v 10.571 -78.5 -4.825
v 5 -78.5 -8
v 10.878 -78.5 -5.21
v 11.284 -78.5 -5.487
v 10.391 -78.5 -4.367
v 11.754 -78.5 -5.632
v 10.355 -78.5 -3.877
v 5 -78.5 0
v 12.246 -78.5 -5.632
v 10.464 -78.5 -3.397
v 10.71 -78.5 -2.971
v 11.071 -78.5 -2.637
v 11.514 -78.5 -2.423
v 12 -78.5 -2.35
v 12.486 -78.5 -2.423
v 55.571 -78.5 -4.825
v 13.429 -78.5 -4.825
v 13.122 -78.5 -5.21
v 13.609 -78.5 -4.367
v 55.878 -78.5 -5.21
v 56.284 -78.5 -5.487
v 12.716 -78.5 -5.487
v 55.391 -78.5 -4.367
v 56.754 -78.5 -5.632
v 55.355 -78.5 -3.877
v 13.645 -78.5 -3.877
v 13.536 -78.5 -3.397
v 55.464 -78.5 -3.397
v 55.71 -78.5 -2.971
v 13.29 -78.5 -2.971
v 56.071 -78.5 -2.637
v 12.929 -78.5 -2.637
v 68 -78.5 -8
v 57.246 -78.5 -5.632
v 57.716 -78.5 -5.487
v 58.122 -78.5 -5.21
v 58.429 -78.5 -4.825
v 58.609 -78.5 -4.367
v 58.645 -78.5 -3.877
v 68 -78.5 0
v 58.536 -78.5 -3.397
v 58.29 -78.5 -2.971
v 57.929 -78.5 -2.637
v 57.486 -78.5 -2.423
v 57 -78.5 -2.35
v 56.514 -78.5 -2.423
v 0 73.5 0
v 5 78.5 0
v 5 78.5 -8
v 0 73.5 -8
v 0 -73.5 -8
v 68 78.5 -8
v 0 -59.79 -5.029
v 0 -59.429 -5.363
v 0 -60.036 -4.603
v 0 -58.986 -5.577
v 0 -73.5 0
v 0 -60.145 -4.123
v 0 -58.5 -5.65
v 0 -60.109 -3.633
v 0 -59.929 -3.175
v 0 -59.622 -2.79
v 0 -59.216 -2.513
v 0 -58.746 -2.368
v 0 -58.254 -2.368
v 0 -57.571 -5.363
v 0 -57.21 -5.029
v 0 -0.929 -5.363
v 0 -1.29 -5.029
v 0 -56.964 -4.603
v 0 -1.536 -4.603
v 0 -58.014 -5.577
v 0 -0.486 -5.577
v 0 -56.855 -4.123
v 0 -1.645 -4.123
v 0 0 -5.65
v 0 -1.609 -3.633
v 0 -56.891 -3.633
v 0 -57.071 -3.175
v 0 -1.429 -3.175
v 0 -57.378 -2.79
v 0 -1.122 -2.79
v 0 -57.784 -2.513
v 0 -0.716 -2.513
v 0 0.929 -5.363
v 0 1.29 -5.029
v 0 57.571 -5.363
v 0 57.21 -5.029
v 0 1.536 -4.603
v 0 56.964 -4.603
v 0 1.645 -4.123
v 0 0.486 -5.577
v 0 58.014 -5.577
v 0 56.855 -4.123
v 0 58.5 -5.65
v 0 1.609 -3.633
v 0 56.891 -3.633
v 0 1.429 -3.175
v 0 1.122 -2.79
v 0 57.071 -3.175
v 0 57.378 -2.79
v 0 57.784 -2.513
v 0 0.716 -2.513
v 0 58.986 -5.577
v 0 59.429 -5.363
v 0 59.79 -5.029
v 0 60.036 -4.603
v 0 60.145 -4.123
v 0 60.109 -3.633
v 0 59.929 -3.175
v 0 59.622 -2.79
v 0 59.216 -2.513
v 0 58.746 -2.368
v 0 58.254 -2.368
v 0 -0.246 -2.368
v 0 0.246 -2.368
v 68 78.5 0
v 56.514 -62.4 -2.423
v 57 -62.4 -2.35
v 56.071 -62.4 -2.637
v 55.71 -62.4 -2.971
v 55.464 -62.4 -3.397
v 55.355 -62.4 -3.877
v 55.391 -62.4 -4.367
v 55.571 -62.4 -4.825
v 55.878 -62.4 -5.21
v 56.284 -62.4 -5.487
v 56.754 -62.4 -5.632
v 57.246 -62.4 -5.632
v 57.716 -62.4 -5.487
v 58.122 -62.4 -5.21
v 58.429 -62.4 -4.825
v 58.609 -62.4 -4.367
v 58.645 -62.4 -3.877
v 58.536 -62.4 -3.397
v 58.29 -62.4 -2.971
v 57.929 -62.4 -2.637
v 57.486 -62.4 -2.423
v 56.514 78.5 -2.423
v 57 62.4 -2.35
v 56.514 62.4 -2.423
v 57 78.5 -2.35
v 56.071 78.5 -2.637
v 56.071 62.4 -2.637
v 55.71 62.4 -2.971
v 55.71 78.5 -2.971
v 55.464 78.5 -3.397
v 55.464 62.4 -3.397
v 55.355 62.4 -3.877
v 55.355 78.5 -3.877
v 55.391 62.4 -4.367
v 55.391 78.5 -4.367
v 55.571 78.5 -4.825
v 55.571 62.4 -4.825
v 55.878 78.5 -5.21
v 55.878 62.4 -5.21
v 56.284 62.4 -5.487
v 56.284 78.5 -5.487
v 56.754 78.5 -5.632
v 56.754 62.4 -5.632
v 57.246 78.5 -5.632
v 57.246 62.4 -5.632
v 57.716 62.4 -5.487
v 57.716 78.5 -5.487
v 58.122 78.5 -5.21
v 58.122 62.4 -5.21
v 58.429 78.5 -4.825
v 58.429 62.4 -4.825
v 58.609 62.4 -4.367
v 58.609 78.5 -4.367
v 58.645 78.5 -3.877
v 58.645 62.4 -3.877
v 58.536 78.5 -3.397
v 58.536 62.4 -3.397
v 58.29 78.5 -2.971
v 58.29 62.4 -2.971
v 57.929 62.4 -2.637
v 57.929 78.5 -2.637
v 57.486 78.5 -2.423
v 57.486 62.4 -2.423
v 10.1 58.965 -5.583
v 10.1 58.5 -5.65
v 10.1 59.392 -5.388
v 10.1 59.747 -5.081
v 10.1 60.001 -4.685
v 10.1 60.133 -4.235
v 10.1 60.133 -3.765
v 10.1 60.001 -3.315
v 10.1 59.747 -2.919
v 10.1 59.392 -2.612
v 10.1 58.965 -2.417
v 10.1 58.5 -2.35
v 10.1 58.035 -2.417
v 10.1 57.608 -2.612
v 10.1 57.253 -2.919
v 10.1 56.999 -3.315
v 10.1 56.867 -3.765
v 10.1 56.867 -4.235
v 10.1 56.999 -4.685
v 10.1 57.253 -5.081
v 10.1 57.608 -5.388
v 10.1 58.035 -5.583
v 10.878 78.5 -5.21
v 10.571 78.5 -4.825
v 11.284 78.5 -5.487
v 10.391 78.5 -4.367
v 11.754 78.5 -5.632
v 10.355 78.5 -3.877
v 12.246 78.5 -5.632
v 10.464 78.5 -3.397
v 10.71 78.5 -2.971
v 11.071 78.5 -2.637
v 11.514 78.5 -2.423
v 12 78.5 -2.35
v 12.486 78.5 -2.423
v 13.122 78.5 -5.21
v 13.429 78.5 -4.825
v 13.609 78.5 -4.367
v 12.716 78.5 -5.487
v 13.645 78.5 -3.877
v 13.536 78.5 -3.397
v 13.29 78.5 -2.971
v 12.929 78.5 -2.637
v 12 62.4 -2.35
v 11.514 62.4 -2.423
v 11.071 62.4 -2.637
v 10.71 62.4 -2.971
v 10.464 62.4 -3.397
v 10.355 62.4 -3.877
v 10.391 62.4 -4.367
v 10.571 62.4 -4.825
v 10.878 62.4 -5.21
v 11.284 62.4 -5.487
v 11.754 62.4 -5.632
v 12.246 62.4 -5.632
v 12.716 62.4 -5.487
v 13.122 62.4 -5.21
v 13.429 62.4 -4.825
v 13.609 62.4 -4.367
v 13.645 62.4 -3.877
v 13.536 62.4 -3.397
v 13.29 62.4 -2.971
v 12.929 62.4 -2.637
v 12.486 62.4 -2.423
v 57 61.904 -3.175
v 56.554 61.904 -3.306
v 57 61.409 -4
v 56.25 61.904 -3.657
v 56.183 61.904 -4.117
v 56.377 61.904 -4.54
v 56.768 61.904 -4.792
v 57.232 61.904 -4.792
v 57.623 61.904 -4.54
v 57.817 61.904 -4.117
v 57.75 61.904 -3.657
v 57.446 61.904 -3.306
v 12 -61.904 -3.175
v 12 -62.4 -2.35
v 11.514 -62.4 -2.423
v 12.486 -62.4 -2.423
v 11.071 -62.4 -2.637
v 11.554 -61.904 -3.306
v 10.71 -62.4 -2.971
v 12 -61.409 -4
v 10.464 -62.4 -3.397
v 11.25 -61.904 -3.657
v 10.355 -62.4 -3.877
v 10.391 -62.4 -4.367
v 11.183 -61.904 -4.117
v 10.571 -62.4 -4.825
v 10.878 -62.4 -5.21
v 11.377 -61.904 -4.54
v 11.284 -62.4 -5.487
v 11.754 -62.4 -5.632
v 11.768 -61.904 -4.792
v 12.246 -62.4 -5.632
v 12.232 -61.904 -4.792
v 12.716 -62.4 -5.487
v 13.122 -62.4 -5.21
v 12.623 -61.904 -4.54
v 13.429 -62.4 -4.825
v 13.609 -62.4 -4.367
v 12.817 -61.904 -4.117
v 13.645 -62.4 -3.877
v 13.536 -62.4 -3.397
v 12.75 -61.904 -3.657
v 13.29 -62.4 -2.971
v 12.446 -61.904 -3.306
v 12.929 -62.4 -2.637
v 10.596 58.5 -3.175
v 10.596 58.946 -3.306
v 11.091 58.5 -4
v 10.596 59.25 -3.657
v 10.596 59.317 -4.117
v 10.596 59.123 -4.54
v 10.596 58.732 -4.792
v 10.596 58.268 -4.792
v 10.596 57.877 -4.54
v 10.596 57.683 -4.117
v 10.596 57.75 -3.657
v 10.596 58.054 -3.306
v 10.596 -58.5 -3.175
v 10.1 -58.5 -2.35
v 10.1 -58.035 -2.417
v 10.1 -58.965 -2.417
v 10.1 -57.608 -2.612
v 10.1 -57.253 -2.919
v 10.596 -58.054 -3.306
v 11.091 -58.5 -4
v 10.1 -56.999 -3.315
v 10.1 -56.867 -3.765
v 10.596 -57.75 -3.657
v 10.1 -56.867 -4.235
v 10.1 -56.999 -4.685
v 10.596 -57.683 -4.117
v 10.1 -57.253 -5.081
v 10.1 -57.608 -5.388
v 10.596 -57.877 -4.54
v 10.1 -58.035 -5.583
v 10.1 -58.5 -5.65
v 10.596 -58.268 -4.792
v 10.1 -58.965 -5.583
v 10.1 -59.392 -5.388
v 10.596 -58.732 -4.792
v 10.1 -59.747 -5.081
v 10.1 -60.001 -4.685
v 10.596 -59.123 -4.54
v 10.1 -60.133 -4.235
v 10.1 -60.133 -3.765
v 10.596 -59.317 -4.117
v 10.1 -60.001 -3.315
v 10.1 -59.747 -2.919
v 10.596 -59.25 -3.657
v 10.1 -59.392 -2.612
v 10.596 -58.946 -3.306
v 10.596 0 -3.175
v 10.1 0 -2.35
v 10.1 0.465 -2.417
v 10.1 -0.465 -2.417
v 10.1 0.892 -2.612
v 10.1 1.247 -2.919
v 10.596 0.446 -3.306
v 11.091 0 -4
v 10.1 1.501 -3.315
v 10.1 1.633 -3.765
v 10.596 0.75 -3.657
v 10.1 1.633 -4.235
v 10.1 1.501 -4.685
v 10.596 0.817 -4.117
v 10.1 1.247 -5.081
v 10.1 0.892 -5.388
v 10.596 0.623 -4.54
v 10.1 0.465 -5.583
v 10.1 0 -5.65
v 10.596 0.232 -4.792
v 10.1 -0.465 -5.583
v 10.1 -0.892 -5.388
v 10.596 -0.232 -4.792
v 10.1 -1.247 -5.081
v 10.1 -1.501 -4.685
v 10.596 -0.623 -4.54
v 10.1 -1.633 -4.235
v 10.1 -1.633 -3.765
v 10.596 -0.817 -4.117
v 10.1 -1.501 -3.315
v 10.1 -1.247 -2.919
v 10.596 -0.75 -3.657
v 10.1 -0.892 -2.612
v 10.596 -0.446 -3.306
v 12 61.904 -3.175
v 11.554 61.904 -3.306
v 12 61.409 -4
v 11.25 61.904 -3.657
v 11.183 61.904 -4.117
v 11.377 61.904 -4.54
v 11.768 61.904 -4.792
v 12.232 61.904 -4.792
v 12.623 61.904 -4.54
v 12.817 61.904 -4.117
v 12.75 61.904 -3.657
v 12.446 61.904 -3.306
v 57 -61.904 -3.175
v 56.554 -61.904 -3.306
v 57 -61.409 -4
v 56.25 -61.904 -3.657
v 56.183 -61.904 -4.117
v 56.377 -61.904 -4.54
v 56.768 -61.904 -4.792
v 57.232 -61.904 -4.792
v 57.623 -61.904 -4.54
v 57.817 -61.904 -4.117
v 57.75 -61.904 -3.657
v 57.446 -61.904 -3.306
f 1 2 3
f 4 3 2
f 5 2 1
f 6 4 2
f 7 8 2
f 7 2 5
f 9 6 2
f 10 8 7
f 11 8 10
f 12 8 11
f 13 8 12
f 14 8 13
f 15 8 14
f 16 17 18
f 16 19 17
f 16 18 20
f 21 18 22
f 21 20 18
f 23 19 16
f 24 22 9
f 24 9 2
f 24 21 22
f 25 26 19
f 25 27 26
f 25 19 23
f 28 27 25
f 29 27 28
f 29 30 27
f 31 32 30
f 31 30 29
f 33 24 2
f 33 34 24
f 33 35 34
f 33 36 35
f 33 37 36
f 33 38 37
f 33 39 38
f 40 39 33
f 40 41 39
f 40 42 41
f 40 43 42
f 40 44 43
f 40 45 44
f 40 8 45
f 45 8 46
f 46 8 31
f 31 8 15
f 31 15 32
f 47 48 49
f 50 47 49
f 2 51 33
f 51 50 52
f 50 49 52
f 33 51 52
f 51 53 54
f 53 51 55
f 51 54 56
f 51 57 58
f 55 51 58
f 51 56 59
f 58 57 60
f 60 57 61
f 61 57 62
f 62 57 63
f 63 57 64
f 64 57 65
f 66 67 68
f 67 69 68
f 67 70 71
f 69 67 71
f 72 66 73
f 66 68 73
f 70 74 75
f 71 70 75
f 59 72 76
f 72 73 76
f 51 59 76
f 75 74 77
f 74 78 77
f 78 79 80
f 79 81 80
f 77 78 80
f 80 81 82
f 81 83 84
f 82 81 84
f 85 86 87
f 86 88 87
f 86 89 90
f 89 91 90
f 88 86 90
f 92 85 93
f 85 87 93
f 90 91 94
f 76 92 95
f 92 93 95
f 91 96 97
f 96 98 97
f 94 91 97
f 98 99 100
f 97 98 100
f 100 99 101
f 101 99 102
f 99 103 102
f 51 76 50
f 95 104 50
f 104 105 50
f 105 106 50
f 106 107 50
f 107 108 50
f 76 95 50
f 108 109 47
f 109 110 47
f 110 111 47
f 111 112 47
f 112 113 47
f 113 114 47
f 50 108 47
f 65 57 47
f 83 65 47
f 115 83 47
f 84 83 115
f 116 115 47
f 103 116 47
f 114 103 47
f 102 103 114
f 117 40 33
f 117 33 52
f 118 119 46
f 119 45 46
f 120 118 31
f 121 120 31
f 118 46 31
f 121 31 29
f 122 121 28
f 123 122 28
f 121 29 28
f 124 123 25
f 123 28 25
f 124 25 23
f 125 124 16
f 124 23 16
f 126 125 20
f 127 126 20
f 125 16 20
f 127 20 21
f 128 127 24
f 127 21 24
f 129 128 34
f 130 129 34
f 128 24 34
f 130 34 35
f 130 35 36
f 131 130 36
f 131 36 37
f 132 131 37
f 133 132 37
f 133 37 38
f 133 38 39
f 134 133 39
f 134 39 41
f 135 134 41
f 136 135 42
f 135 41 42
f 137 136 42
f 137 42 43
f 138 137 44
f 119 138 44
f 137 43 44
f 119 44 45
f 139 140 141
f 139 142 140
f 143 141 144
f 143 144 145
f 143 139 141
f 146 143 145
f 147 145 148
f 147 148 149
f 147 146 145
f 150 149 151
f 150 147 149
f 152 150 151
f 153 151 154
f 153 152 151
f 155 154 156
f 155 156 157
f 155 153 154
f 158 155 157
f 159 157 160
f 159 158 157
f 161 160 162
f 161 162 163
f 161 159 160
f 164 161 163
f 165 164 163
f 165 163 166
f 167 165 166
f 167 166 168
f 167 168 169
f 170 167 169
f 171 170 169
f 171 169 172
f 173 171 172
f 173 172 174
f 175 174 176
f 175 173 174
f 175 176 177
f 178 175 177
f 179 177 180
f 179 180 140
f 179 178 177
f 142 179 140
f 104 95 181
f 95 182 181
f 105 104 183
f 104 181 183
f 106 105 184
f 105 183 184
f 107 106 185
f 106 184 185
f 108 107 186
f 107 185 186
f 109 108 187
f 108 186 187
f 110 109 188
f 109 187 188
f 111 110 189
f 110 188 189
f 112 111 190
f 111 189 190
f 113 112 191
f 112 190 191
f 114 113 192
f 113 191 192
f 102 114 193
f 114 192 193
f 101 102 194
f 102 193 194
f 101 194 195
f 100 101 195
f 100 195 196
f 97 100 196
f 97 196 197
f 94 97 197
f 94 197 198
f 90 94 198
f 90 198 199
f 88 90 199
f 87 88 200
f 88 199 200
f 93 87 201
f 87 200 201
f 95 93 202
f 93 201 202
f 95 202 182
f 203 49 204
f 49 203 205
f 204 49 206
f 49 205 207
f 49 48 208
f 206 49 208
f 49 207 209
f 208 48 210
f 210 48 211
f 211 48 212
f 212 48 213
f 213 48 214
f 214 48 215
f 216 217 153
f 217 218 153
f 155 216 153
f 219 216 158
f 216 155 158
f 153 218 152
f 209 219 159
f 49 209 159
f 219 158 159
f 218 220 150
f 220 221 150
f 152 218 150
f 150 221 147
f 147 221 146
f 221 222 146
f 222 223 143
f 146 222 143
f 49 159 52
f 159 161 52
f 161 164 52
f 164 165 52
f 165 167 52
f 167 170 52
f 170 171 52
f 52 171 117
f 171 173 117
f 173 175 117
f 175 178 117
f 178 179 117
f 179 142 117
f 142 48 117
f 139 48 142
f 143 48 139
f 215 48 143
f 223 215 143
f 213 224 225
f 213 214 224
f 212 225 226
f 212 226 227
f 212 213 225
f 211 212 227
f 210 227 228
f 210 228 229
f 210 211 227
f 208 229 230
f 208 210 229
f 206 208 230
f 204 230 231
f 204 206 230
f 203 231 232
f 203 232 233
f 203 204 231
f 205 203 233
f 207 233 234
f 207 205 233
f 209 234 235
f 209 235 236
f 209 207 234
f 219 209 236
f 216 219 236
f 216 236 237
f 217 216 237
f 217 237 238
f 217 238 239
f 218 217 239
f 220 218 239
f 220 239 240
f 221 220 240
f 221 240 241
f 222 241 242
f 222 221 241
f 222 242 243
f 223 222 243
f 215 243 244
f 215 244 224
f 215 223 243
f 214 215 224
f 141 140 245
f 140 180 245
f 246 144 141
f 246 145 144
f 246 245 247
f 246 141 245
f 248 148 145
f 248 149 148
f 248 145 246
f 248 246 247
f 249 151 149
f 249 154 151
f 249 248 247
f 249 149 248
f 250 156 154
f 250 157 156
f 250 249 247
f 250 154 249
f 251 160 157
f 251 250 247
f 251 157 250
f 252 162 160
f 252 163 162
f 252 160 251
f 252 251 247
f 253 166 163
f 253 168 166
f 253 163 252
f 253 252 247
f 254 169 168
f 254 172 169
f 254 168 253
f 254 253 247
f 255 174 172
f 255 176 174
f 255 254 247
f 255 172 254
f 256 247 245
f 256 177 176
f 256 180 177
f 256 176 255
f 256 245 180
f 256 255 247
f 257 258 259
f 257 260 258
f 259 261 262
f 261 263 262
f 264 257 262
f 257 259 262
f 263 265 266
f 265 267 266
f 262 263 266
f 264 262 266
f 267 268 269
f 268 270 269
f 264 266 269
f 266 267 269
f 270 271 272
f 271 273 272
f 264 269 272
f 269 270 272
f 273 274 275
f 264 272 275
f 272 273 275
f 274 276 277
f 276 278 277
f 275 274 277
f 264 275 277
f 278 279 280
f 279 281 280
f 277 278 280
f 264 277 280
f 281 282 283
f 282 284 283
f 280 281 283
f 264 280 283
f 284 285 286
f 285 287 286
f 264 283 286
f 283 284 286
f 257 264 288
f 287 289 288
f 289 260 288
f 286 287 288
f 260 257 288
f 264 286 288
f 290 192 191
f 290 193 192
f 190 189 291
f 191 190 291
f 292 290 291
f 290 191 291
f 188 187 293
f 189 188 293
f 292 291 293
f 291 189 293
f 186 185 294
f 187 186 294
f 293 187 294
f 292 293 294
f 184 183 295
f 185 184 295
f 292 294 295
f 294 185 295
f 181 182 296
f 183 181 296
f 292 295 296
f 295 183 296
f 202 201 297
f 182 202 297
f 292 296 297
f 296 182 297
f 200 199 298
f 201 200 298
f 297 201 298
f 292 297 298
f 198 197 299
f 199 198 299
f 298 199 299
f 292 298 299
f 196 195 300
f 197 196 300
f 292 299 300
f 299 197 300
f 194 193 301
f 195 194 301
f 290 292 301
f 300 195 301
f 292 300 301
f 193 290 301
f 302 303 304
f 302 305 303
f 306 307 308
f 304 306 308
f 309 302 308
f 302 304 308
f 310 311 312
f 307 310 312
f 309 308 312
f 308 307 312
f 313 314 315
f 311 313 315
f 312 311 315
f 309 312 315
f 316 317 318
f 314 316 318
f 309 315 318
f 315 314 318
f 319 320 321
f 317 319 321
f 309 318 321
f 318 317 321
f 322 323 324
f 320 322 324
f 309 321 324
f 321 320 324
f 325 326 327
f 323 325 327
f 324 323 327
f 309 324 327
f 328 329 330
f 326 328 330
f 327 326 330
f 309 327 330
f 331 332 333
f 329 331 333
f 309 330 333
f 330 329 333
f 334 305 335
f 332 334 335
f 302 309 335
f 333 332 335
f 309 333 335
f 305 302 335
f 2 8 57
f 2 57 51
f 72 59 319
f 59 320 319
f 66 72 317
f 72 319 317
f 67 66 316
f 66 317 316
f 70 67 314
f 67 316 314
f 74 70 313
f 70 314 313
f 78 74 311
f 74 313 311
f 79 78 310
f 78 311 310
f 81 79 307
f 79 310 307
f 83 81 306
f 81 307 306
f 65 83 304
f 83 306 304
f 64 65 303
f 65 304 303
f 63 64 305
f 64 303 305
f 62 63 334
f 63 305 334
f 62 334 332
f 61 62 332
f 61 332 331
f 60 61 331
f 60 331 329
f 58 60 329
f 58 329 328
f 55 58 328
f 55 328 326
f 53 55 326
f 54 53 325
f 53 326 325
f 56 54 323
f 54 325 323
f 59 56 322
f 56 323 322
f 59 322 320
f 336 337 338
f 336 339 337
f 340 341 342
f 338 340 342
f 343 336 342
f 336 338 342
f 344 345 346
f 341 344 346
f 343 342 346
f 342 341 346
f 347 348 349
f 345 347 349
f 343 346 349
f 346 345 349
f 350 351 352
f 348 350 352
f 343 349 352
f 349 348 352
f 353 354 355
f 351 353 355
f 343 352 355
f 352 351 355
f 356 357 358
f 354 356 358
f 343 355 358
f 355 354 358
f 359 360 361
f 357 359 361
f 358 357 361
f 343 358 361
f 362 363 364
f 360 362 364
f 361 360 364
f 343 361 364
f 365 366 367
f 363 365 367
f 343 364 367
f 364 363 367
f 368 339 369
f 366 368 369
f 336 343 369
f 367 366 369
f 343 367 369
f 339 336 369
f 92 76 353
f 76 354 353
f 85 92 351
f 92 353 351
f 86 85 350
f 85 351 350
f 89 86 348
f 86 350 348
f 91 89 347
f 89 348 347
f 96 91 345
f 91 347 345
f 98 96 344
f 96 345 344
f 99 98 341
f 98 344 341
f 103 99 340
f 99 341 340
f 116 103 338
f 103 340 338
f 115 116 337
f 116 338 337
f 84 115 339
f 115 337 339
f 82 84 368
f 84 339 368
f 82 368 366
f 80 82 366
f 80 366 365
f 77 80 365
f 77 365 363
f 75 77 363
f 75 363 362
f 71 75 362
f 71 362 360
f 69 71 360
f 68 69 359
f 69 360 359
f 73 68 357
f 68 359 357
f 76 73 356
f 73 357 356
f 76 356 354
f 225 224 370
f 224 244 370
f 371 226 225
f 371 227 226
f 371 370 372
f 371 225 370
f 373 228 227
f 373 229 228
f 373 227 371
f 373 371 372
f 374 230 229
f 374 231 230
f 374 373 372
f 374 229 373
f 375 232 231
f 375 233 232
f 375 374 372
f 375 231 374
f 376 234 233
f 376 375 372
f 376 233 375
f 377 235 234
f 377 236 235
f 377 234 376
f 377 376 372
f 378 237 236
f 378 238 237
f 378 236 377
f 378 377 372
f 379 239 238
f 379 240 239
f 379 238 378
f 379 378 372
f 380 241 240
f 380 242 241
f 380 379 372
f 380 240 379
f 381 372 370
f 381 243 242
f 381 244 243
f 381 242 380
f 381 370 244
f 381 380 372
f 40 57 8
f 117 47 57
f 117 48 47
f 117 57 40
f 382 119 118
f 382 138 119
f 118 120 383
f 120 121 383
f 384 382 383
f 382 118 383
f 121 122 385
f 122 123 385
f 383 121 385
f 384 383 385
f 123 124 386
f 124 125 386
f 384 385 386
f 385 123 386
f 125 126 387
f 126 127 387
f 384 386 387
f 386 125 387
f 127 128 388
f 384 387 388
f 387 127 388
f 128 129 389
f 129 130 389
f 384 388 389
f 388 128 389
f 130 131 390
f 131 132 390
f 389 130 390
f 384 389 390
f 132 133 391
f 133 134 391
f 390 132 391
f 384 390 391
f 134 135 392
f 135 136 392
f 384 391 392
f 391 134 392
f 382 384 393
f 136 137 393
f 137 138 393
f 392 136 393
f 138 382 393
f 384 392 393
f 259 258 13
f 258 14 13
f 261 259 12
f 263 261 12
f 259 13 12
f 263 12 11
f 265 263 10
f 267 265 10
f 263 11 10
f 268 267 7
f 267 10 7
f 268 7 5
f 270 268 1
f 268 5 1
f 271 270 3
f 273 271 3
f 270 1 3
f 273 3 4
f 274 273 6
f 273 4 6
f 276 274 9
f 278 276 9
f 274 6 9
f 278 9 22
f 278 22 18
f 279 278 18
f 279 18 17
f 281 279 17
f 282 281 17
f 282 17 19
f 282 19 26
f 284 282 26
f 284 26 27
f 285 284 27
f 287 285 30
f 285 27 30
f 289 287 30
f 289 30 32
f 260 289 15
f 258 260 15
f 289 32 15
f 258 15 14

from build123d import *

# Parameters (mm, degrees)
SKETCH1_W                      = 68
SKETCH1_H                      = 157
BOSS_EXTRUDE1_DEPTH            = 8
M4X0_7_TAPPED_HOLE1_AT_2_COUNT = 2
M4X0_7_TAPPED_HOLE1_AT_2_PITCH = 45
M4X0_7_TAPPED_HOLE2_D          = 3.3
M4X0_7_TAPPED_HOLE2_DEPTH      = 10.1
M4X0_7_TAPPED_HOLE2_TIP        = 0.991420021
CHAMFER1_SIZE                  = 5


with BuildPart() as part:
    # Sketch1 → Boss-Extrude1 (new body)
    with BuildSketch(Plane.XY):
        with Locations((34, 0)):
            Rectangle(SKETCH1_W, SKETCH1_H)
    extrude(amount=-BOSS_EXTRUDE1_DEPTH)

    # Sketch4 → M4x0.7 Tapped Hole1 (revolve, cut)
    with BuildSketch(Plane(origin=(12, 78.5, -4), x_dir=(0, 0, 1), z_dir=(1, 0, 0))):
        Polygon((0, 0), (0, 17.091420021), (1.65, 16.1), (1.65, 0), align=None)
    m4x0_7_tapped_hole1 = revolve(axis=Axis((12, 84.85, -4), (0, -1, 0)), mode=Mode.SUBTRACT)

    # M4x0.7 Tapped Hole1 at 2: M4x0.7 Tapped Hole1 ×2
    with Locations(*[(i * M4X0_7_TAPPED_HOLE1_AT_2_PITCH, 0, 0) for i in range(1, M4X0_7_TAPPED_HOLE1_AT_2_COUNT)]):
        add(m4x0_7_tapped_hole1, mode=Mode.SUBTRACT)

    # M4x0.7 Tapped Hole2
    with Locations(Plane.ZY):
        with Locations((-4, 58.5), (-4, 0), (-4, -58.5)):
            Hole(M4X0_7_TAPPED_HOLE2_D / 2, depth=M4X0_7_TAPPED_HOLE2_DEPTH)
            with Locations((0, 0, -(M4X0_7_TAPPED_HOLE2_DEPTH + M4X0_7_TAPPED_HOLE2_TIP / 2))):  # 118° drill point
                Cone(0, M4X0_7_TAPPED_HOLE2_D / 2, M4X0_7_TAPPED_HOLE2_TIP, mode=Mode.SUBTRACT)

    # Mirror1: M4x0.7 Tapped Hole1 across plane
    add(m4x0_7_tapped_hole1.mirror(Plane.ZX), mode=Mode.SUBTRACT)

    # Mirror1 copy 1 sketch → Mirror1 copy 1 (revolve, cut)
    with BuildSketch(Plane(origin=(57, -78.5, -4), x_dir=(0, 0, 1), z_dir=(1, 0, 0))):
        Polygon((0, 0), (0, -17.091420021), (1.65, -16.1), (1.65, 0), align=None)
    revolve(axis=Axis((57, -84.85, -4), (0, -1, 0)), mode=Mode.SUBTRACT)

    # Chamfer1
    chamfer1_edges = [part.edges().sort_by_distance(p)[0] for p in [
        (0, -78.5, -4),
        (0, 78.5, -4),
    ]]
    chamfer(chamfer1_edges, length=CHAMFER1_SIZE)


solid = part.part
